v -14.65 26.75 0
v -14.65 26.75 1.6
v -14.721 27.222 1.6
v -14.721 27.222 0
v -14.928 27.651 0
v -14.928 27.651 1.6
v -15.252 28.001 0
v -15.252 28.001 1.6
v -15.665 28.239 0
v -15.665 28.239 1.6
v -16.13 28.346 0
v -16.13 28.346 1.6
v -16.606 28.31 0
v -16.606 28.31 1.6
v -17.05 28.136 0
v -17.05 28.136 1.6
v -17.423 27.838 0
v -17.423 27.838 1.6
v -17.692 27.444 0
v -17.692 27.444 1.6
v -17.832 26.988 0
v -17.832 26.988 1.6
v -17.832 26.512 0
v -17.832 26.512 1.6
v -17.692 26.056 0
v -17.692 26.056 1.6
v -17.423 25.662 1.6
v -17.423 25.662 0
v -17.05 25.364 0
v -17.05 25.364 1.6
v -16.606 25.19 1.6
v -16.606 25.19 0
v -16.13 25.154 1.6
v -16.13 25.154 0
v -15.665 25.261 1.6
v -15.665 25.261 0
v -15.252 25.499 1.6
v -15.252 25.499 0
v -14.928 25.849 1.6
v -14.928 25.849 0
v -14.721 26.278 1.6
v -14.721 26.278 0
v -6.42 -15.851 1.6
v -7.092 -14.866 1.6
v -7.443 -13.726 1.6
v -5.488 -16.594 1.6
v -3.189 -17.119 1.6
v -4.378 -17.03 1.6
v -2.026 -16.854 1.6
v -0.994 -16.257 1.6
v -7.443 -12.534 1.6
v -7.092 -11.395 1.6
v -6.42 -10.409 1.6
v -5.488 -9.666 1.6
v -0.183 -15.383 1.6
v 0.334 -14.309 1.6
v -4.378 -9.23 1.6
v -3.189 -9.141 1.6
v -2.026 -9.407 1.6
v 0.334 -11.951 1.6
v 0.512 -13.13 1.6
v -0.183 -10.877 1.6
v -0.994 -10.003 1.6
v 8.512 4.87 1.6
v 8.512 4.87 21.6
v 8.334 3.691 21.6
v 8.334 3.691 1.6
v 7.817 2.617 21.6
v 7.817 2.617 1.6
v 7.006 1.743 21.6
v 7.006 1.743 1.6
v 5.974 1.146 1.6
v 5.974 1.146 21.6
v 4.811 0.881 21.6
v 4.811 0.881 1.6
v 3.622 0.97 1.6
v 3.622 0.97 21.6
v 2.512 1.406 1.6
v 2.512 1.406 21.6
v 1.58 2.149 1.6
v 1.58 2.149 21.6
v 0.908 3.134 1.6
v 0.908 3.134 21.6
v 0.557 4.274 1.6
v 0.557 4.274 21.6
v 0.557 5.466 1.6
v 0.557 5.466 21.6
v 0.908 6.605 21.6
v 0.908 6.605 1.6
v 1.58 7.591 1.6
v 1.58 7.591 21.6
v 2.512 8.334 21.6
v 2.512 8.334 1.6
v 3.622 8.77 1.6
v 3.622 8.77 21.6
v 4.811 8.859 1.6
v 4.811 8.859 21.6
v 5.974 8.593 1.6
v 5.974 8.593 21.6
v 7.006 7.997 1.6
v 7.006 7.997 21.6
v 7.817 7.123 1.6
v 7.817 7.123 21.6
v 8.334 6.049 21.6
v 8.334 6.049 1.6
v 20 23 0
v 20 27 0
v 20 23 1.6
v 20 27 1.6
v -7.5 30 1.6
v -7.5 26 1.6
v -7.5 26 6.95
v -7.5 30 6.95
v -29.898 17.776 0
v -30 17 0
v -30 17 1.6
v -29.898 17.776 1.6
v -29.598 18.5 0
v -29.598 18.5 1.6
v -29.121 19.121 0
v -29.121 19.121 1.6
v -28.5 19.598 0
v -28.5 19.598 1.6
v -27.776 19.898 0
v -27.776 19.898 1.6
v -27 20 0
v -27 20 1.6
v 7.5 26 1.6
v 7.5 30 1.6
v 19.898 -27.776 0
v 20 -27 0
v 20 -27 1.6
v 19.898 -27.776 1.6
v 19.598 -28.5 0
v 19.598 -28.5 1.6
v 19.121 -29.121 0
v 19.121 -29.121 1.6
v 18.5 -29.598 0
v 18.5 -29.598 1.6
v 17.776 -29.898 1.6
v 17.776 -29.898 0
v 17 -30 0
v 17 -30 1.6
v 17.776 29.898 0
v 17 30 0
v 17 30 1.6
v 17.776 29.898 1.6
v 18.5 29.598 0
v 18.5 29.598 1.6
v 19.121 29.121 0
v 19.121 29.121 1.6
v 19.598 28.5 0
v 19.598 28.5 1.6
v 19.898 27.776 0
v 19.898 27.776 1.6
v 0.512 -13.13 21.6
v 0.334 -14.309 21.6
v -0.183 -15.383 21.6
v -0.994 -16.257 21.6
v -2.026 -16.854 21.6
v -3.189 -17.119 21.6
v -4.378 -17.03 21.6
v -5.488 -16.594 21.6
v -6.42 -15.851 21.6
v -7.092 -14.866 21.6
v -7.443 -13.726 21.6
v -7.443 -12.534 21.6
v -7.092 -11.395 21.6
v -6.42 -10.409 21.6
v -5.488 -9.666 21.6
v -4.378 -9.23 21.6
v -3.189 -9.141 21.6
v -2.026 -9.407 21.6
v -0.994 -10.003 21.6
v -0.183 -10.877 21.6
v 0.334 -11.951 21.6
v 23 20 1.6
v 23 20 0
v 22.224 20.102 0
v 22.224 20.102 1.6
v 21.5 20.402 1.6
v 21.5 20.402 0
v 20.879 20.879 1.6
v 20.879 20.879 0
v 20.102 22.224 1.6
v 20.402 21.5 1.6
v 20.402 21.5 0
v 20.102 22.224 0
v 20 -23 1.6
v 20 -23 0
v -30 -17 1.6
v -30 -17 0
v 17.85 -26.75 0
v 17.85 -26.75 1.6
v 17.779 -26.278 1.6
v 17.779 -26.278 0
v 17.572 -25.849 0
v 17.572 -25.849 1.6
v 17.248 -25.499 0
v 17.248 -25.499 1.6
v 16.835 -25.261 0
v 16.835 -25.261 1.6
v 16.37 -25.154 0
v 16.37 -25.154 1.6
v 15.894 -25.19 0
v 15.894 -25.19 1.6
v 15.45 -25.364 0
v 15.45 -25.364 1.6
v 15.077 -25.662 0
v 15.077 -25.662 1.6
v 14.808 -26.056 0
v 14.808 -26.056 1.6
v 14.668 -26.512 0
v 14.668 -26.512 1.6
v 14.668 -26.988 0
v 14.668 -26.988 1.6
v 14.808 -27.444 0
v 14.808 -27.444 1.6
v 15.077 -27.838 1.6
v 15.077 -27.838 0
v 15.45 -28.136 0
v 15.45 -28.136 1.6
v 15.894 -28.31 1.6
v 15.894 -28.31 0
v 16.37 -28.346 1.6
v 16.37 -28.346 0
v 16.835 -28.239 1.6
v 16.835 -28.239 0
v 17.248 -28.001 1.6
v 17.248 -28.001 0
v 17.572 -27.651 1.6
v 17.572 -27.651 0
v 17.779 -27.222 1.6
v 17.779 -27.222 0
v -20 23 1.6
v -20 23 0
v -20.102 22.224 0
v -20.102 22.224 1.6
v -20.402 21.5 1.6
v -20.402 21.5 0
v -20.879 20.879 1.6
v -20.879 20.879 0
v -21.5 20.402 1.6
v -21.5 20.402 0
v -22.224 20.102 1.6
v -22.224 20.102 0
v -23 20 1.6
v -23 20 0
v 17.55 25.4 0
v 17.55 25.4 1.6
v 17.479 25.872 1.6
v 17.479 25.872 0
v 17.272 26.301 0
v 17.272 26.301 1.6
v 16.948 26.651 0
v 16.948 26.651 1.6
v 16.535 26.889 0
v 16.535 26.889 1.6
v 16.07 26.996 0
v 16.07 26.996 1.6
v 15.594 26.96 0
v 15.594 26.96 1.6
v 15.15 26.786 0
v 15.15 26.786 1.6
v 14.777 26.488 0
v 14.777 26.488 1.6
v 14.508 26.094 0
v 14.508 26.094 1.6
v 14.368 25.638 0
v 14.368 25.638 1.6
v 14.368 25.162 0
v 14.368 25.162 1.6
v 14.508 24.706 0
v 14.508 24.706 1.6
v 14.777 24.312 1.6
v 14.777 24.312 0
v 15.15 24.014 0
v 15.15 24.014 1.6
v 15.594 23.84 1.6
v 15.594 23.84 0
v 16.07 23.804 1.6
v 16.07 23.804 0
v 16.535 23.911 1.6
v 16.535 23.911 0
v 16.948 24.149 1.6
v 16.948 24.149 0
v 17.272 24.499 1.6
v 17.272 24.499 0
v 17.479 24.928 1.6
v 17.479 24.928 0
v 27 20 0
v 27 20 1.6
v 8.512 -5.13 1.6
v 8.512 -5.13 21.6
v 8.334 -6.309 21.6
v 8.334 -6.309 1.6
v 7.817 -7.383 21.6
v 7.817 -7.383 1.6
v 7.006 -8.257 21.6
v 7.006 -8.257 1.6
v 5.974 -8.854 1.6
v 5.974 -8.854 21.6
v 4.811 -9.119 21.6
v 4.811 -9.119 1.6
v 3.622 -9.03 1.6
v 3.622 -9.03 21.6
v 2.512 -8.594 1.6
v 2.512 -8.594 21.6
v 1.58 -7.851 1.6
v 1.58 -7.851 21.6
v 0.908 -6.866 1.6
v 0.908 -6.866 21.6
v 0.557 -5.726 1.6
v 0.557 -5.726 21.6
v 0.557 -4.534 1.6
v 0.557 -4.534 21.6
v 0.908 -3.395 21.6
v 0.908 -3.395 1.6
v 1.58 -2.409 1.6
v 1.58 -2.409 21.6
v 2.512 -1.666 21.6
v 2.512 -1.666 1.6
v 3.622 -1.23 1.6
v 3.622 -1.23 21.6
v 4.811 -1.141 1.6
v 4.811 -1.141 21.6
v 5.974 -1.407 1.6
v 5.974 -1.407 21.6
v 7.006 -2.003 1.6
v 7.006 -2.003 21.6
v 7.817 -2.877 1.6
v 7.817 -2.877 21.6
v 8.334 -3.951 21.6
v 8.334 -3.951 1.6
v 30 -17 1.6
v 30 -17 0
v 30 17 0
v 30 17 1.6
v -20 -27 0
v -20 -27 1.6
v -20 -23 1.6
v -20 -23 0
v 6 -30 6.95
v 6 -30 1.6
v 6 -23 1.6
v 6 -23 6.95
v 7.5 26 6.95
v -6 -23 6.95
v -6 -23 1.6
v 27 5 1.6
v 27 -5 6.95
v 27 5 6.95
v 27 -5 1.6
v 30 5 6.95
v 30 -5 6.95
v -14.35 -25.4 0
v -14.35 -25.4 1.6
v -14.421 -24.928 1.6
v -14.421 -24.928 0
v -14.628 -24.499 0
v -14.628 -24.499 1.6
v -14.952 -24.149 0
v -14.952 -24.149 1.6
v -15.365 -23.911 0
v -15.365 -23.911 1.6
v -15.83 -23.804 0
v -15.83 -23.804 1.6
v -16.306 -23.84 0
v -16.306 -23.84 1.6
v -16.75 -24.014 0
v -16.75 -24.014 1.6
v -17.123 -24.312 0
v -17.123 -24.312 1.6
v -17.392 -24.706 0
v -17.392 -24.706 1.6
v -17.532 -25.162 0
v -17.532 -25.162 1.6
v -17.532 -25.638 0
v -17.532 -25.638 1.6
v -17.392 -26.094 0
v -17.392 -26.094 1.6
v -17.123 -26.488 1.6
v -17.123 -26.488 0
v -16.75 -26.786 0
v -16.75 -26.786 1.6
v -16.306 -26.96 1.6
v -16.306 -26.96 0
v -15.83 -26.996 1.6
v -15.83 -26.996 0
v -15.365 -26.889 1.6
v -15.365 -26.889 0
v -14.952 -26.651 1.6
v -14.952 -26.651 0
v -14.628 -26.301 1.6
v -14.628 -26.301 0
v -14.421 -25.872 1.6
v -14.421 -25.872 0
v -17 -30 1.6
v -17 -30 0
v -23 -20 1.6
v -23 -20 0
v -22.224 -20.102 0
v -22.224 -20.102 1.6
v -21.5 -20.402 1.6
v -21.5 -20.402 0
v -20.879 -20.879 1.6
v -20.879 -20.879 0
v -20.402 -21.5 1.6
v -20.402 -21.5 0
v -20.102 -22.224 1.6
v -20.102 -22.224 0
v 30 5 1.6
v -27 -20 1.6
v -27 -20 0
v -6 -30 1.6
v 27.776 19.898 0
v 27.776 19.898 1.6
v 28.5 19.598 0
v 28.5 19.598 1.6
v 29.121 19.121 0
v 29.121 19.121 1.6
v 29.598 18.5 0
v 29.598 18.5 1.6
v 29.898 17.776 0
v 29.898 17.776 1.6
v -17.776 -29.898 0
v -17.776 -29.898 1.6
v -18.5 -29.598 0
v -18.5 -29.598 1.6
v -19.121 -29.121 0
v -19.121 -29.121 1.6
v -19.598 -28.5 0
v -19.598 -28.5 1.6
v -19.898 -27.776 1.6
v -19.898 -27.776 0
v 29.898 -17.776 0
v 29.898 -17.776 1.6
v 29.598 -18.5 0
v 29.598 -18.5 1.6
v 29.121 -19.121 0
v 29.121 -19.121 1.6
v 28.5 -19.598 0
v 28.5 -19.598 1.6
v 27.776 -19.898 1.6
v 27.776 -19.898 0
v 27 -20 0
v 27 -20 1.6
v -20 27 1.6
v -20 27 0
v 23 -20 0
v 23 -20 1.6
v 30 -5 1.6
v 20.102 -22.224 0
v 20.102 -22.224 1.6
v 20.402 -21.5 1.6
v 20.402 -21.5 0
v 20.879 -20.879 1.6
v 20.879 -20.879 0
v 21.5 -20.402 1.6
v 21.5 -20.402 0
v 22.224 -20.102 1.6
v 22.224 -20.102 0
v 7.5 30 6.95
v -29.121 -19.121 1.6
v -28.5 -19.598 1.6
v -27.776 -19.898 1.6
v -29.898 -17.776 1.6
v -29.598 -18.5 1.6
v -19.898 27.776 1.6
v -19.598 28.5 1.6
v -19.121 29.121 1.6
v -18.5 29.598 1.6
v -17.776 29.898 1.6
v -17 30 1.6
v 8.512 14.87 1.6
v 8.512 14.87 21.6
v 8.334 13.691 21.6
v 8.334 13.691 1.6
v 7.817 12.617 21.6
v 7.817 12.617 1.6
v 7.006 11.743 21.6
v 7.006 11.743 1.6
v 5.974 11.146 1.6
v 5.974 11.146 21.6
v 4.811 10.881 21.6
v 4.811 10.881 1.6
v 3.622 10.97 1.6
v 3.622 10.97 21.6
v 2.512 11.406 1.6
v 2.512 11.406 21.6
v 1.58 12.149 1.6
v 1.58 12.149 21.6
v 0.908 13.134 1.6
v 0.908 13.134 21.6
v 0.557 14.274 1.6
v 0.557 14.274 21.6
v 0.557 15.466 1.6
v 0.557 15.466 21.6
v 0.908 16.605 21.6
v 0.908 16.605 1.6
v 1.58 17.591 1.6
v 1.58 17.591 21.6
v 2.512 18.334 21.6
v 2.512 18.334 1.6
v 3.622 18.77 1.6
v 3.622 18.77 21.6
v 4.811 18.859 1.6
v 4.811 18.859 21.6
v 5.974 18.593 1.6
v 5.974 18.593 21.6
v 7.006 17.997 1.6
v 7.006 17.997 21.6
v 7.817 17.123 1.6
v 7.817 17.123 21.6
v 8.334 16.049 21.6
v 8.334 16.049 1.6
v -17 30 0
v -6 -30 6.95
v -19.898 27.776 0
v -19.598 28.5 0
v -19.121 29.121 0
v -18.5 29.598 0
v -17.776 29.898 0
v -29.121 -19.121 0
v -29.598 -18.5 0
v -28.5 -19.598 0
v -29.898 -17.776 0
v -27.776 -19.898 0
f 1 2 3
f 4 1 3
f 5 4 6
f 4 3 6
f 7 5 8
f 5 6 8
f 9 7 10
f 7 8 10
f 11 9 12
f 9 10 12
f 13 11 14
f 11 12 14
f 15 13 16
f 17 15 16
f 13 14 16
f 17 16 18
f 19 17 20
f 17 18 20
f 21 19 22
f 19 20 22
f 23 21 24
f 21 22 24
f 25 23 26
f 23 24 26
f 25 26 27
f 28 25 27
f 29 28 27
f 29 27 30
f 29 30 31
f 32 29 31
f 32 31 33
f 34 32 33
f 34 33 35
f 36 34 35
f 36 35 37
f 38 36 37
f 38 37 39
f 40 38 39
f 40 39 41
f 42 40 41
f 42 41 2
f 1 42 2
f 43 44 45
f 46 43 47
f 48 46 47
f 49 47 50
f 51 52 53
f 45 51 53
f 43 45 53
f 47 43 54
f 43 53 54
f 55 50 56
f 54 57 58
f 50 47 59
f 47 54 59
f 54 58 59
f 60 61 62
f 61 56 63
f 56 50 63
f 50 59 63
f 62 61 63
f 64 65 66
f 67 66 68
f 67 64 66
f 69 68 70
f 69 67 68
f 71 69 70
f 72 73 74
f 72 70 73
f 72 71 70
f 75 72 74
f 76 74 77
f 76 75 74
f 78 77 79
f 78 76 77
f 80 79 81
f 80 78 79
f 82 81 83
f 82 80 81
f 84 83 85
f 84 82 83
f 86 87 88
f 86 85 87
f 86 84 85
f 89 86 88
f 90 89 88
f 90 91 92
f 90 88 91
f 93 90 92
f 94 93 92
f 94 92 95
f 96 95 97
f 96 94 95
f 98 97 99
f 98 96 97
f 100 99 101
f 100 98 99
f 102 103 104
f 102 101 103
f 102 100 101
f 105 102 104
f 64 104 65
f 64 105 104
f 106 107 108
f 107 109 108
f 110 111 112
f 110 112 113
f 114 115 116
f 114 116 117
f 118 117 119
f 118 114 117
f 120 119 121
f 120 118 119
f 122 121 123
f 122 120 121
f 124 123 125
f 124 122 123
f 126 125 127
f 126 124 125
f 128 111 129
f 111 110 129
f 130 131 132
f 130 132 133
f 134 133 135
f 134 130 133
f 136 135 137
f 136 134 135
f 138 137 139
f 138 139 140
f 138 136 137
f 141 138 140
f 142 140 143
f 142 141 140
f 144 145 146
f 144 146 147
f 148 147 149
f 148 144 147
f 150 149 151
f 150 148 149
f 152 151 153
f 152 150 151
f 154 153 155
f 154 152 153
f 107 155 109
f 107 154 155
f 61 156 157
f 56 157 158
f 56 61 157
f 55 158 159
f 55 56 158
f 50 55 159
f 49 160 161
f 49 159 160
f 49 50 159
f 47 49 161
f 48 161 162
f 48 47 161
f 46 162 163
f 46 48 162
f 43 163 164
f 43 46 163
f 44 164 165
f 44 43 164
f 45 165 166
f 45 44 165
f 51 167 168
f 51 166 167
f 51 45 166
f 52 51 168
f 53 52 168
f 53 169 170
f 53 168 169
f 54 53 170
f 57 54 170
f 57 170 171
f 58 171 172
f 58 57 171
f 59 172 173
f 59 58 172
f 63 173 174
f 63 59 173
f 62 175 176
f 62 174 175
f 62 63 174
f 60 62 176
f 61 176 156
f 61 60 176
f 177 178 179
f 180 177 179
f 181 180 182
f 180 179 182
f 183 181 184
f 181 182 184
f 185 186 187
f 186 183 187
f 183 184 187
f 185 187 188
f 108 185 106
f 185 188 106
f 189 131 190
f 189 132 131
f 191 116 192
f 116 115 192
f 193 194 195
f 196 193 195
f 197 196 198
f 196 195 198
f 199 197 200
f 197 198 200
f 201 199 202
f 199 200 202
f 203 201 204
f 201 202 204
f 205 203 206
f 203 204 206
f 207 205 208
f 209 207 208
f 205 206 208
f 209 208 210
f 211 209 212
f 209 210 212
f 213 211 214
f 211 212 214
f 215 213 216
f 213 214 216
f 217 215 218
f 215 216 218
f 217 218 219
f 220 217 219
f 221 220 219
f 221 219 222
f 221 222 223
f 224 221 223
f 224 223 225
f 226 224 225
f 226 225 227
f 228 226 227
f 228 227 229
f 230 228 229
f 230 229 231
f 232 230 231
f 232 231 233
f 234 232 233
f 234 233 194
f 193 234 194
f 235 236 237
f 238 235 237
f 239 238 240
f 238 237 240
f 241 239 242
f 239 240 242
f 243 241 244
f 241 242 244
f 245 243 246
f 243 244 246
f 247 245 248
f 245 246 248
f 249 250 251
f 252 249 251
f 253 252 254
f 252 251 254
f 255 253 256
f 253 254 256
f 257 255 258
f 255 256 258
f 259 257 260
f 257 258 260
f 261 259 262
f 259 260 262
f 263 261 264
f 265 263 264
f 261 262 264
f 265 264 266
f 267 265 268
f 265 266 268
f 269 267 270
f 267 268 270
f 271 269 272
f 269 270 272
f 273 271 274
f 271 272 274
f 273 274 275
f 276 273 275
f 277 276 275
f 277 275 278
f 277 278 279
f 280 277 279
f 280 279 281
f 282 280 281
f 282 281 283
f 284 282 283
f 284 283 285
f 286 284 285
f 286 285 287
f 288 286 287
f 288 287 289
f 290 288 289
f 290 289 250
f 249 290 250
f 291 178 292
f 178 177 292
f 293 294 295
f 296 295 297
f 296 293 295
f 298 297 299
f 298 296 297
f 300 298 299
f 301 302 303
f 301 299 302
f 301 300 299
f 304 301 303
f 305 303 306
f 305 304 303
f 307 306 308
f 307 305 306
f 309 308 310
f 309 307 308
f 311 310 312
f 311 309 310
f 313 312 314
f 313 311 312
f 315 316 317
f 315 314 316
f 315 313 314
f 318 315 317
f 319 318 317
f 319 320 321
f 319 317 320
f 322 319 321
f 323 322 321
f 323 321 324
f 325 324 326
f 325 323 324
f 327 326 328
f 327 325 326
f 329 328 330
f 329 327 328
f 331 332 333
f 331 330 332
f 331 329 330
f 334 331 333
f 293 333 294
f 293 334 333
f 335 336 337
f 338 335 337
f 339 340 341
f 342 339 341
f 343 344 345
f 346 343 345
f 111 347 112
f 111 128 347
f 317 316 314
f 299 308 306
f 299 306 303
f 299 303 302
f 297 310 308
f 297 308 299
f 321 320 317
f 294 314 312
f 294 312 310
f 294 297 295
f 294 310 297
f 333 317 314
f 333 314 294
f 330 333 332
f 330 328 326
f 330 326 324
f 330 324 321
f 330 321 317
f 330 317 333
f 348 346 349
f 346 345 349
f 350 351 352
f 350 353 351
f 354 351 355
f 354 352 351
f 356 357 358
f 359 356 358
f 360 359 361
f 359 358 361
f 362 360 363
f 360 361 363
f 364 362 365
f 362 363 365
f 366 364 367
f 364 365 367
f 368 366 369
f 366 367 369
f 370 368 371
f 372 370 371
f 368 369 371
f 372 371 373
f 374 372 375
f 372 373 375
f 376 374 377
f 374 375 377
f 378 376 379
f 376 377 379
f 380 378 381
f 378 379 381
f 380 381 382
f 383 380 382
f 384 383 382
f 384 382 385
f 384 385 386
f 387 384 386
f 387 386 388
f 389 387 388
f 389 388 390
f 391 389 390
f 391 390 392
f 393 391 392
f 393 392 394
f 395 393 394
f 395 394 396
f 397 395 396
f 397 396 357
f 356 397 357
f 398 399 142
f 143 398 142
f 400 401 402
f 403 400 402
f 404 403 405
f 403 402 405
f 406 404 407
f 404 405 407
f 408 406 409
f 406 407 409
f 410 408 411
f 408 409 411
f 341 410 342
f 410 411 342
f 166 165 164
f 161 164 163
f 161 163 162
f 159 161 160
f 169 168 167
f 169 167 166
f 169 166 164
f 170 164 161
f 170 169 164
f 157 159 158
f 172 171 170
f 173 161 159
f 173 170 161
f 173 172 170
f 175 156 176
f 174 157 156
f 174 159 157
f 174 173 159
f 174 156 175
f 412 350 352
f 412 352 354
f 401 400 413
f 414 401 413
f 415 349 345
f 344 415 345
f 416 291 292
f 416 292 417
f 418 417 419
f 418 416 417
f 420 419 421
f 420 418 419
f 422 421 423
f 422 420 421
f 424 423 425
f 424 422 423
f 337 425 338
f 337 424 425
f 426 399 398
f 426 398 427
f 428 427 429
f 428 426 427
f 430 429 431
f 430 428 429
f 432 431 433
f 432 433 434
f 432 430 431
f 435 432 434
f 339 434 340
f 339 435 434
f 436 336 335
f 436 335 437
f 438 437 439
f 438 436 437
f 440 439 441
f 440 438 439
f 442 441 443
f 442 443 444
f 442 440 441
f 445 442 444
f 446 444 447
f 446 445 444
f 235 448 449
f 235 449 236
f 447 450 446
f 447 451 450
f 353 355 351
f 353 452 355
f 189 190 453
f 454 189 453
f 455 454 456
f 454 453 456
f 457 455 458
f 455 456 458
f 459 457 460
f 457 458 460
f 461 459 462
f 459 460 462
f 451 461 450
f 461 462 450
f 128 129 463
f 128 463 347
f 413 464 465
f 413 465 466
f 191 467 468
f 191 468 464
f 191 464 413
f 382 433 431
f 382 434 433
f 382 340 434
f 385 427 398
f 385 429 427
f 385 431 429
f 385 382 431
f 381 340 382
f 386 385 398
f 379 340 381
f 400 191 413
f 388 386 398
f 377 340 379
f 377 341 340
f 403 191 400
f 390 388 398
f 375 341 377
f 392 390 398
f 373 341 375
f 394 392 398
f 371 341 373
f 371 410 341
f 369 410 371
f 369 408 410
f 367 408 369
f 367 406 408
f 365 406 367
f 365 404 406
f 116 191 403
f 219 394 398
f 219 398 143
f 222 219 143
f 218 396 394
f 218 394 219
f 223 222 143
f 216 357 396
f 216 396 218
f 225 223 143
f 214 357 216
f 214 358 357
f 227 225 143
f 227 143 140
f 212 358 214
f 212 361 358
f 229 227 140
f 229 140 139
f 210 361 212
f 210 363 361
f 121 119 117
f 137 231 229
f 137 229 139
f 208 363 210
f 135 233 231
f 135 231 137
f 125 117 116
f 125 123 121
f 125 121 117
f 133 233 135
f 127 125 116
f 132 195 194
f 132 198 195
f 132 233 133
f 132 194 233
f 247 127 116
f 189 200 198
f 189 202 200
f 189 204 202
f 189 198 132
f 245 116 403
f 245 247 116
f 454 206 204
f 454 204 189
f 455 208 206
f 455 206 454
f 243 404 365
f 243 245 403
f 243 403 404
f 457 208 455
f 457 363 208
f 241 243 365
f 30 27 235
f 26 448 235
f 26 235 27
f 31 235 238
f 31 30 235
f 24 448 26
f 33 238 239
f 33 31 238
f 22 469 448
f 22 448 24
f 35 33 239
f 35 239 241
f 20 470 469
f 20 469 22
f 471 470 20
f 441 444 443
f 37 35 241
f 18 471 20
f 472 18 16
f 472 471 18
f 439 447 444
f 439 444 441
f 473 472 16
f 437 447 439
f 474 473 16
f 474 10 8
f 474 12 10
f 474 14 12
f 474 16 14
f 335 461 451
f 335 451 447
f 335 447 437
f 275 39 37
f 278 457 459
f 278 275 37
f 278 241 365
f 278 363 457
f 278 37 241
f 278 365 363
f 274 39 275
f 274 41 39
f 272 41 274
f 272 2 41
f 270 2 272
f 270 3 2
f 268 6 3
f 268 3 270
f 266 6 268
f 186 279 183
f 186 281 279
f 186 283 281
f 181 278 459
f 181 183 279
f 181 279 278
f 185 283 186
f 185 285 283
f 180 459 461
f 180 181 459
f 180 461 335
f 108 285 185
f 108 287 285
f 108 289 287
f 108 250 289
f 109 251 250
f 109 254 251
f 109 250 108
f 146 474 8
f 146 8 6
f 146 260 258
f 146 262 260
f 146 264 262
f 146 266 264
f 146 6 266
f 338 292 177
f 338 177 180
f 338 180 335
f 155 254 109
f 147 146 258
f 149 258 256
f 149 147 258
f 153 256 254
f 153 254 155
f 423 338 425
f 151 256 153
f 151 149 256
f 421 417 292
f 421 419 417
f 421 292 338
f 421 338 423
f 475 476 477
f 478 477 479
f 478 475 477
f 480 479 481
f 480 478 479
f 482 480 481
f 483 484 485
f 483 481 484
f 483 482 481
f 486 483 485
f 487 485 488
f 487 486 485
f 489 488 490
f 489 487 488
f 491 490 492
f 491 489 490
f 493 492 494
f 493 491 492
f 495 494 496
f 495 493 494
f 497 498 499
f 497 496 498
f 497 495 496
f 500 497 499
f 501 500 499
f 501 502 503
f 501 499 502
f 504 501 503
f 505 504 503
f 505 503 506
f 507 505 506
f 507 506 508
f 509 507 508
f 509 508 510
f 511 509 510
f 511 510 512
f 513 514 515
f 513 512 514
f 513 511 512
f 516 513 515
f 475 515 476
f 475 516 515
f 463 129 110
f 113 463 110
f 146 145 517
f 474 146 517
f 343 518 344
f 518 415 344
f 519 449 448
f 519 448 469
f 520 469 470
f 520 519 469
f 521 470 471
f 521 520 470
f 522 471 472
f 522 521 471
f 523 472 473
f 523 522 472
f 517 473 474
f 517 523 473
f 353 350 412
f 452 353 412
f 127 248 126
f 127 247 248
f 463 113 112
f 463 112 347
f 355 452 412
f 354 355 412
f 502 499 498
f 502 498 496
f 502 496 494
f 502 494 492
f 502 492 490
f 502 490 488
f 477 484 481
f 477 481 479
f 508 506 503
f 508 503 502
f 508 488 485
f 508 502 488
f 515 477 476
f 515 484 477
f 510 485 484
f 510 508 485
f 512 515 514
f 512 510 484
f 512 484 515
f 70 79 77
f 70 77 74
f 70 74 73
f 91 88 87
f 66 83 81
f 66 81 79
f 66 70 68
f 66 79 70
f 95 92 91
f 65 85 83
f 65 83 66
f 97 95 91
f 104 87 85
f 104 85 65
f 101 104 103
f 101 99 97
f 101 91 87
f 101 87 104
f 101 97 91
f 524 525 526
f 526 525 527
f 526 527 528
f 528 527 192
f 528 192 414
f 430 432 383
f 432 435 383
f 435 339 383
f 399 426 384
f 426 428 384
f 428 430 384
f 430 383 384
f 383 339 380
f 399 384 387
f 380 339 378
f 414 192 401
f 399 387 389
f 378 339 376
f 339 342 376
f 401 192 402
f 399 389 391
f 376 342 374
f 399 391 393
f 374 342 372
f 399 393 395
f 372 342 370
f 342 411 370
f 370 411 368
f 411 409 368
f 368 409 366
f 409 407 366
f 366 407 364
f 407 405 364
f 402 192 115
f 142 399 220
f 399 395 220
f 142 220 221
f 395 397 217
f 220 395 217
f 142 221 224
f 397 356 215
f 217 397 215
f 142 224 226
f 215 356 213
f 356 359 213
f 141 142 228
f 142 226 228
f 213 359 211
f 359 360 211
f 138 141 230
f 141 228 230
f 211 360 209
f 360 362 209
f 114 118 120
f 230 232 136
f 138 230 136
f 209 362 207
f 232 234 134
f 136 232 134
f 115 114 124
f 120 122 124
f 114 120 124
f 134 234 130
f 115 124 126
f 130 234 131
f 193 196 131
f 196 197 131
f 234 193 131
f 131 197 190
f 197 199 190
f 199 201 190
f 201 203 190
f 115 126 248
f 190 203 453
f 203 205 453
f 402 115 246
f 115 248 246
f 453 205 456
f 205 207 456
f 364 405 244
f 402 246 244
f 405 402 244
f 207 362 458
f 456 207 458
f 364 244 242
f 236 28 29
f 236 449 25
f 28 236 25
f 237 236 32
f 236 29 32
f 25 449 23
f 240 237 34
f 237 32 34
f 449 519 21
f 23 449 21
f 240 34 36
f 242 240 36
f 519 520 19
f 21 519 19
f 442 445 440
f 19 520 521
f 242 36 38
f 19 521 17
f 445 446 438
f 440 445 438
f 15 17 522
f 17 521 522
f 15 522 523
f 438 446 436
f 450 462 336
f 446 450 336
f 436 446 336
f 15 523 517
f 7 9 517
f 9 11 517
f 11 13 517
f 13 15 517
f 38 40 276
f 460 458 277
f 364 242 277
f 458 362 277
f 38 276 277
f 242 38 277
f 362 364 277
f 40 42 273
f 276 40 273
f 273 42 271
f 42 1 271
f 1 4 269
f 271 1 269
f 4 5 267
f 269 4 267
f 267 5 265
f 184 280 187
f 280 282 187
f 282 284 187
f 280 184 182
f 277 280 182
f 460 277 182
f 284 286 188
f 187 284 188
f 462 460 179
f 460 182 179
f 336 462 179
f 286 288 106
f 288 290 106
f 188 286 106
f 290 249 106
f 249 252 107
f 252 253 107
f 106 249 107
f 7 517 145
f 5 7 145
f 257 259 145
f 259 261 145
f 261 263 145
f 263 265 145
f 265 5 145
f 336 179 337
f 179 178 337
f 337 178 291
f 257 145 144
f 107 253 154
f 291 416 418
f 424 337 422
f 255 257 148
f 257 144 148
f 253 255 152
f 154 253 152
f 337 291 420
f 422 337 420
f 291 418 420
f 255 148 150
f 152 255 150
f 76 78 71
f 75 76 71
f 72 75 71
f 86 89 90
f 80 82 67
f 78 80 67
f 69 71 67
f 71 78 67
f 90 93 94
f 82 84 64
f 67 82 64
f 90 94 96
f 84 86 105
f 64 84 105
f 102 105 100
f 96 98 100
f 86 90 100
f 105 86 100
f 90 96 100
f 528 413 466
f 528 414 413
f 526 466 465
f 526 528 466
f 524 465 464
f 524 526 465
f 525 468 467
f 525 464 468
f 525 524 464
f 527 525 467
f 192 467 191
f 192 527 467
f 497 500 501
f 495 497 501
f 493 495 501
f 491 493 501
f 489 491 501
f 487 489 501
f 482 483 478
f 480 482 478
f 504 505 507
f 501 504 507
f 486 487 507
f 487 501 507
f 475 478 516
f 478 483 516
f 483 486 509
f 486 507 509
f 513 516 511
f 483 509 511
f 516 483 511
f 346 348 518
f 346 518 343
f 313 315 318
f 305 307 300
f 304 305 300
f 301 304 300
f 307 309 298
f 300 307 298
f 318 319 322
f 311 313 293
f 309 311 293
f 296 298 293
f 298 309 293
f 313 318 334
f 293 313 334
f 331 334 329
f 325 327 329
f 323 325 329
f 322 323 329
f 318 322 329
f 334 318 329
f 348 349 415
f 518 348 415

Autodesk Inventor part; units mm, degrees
ref_plane "YZ Plane" through (0, 0, 0) normal (1, 0, 0) x (0, 1, 0)
ref_plane "XZ Plane" through (0, 0, 0) normal (0, 1, 0) x (-1, 0, 0)
ref_plane "XY Plane" through (0, 0, 0) normal (0, 0, 1) x (1, 0, 0)
sketch "Sketch1" plane through (0, 0, 0) normal (0, 0, 1) x (1, 0, 0)
  line L0 (-30, -30) -> (30, -30)
  line L1 (30, -30) -> (30, 30)
  line L2 (30, 30) -> (-30, 30)
  line L3 (-30, 30) -> (-30, -30)
  line L4 (-30, -30) -> (30, 30) construction
  line L5 (30, -30) -> (-30, 30) construction
  point P0 (0, 0)
  dimension "d0" = 60
  dimension "d1" = 60
extrude "Extrusion1" add sketch "Sketch1" along normal blind 1.6
sketch "Sketch2" plane through (0, 0, 1.6) normal (0, 0, 1) x (1, 0, 0)
  line L0 (-30, -30) -> (30, -30) construction
  line L1 (30, -30) -> (30, 30) construction
  line L2 (30, 30) -> (-30, 30) construction
  line L3 (-30, 30) -> (-30, -30) construction
  line L4 (-30, -30) -> (-20, -30)
  line L5 (-20, -30) -> (-20, -20)
  line L6 (-20, -20) -> (-30, -20)
  line L7 (-30, -20) -> (-30, -30)
  line L8 (-42, 0) -> (42, 0) construction
  line L9 (0, -42) -> (0, 42) construction
  line L10 (-30, 30) -> (-20, 30)
  line L11 (-20, 30) -> (-20, 20)
  line L12 (-20, 20) -> (-30, 20)
  line L13 (-30, 20) -> (-30, 30)
  line L14 (30, 30) -> (30, -30) construction
  line L15 (30, -30) -> (20, -30)
  line L16 (20, -30) -> (20, -20)
  line L17 (20, -20) -> (30, -20)
  line L18 (30, -20) -> (30, -30)
  line L19 (30, 30) -> (20, 30)
  line L20 (20, 30) -> (20, 20)
  line L21 (20, 20) -> (30, 20)
  line L22 (30, 20) -> (30, 30)
  point P0 (0, 0)
  dimension "d4" = 10
  dimension "d5" = 10
extrude "Extrusion2" cut sketch "Sketch2" against normal blind 1.6
fillet "Fillet1" radius 3 12 edges at (30, 20, 0.8) (20, 20, 0.8) (20, 30, 0.8) (-20, 30, 0.8) (-20, 20, 0.8) (-30, 20, 0.8) (-30, -20, 0.8) (-20, -20, 0.8) (-20, -30, 0.8) (20, -30, 0.8) (20, -20, 0.8) (30, -20, 0.8)
sketch "Sketch3" plane through (0, 0, 1.6) normal (0, 0, 1) x (1, 0, 0)
  line L0 (-42, 0) -> (42, 0) construction
  line L1 (0, -42) -> (0, 42) construction
  circle A0 centre (16.25, -26.75) radius 1.6
  line L2 (-17, -30) -> (17, -30) construction
  line L3 (30, -17) -> (30, 17) construction
  circle A1 centre (-15.95, -25.4) radius 1.6
  circle A2 centre (-16.25, 26.75) radius 1.6
  circle A3 centre (15.95, 25.4) radius 1.6
  point P0 (0, 0)
  dimension "d9" = 3.25
  dimension "d10" = 13.75
  dimension "d11" = 3.2
  dimension "d12" = 3.2
  dimension "d13" = 3.2
  dimension "d14" = 3.2
  dimension "d15" = 4.6
  dimension "d16" = 45.95
  dimension "d17" = 56.75
  dimension "d18" = 46.25
  dimension "d19" = 55.4
  dimension "d20" = 14.05
  dimension "d41" = 52.15
  dimension "d42" = 0.3
  dimension "d43" = 32.2
  dimension "d44" = 32.2
  dimension "d45" = 52.15
  dimension "d46" = 1.35
extrude "Extrusion3" cut sketch "Sketch3" against normal blind 1.6
sketch "Sketch4" plane through (0, 0, 1.6) normal (0, 0, 1) x (1, 0, 0)
  line L0 (-17, -30) -> (17, -30) projected
  line L1 (-6, -30) -> (6, -30)
  line L2 (6, -30) -> (6, -23)
  line L3 (6, -23) -> (-6, -23)
  line L4 (-6, -23) -> (-6, -30)
  line L5 (17, 30) -> (-17, 30) projected
  line L6 (-7.5, 30) -> (7.5, 30)
  line L7 (7.5, 30) -> (7.5, 26)
  line L8 (7.5, 26) -> (-7.5, 26)
  line L9 (-7.5, 26) -> (-7.5, 30)
  line L10 (30, -17) -> (30, 17) projected
  line L11 (30, -17) -> (30, 17) projected
  line L12 (30, -5) -> (27, -5)
  line L13 (27, -5) -> (27, 5)
  line L14 (27, 5) -> (30, 5)
  line L15 (30, 5) -> (30, -5)
  point P0 (0, 0)
  dimension "d23" = 12
  dimension "d24" = 7
  dimension "d25" = 6
  dimension "d26" = 15
  dimension "d27" = 7.5
  dimension "d28" = 4
  dimension "d29" = 3
  dimension "d30" = 5
  dimension "d31" = 10
extrude "Extrusion4" add sketch "Sketch4" along normal blind 5.35 separate body
sketch "Sketch5" plane through (0, 0, 1.6) normal (0, 0, 1) x (1, 0, 0)
  circle A0 centre (-3.4878, -13.1301) radius 4
  circle A1 centre (4.5122, -5.1301) radius 4
  circle A2 centre (4.5122, 4.8699) radius 4
  circle A3 centre (4.5122, 14.8699) radius 4
  line L0 (4.5122, -5.1301) -> (4.5122, 14.6748) construction
  point P0 (0, 0)
  dimension "d34" = 10
  dimension "d35" = 10
  dimension "d36" = 8
  dimension "d37" = 8
  dimension "d38" = 8
extrude "Extrusion5" add sketch "Sketch5" along normal blind 20 separate body
equation "\"d5\" = d4"
equation "\"d12\" = d11"
equation "\"d13\" = d12"
equation "\"d14\" = d13"
equation "\"d30\" = 0.5 * d31"
properties part number "TMCM-1260_PCB"
